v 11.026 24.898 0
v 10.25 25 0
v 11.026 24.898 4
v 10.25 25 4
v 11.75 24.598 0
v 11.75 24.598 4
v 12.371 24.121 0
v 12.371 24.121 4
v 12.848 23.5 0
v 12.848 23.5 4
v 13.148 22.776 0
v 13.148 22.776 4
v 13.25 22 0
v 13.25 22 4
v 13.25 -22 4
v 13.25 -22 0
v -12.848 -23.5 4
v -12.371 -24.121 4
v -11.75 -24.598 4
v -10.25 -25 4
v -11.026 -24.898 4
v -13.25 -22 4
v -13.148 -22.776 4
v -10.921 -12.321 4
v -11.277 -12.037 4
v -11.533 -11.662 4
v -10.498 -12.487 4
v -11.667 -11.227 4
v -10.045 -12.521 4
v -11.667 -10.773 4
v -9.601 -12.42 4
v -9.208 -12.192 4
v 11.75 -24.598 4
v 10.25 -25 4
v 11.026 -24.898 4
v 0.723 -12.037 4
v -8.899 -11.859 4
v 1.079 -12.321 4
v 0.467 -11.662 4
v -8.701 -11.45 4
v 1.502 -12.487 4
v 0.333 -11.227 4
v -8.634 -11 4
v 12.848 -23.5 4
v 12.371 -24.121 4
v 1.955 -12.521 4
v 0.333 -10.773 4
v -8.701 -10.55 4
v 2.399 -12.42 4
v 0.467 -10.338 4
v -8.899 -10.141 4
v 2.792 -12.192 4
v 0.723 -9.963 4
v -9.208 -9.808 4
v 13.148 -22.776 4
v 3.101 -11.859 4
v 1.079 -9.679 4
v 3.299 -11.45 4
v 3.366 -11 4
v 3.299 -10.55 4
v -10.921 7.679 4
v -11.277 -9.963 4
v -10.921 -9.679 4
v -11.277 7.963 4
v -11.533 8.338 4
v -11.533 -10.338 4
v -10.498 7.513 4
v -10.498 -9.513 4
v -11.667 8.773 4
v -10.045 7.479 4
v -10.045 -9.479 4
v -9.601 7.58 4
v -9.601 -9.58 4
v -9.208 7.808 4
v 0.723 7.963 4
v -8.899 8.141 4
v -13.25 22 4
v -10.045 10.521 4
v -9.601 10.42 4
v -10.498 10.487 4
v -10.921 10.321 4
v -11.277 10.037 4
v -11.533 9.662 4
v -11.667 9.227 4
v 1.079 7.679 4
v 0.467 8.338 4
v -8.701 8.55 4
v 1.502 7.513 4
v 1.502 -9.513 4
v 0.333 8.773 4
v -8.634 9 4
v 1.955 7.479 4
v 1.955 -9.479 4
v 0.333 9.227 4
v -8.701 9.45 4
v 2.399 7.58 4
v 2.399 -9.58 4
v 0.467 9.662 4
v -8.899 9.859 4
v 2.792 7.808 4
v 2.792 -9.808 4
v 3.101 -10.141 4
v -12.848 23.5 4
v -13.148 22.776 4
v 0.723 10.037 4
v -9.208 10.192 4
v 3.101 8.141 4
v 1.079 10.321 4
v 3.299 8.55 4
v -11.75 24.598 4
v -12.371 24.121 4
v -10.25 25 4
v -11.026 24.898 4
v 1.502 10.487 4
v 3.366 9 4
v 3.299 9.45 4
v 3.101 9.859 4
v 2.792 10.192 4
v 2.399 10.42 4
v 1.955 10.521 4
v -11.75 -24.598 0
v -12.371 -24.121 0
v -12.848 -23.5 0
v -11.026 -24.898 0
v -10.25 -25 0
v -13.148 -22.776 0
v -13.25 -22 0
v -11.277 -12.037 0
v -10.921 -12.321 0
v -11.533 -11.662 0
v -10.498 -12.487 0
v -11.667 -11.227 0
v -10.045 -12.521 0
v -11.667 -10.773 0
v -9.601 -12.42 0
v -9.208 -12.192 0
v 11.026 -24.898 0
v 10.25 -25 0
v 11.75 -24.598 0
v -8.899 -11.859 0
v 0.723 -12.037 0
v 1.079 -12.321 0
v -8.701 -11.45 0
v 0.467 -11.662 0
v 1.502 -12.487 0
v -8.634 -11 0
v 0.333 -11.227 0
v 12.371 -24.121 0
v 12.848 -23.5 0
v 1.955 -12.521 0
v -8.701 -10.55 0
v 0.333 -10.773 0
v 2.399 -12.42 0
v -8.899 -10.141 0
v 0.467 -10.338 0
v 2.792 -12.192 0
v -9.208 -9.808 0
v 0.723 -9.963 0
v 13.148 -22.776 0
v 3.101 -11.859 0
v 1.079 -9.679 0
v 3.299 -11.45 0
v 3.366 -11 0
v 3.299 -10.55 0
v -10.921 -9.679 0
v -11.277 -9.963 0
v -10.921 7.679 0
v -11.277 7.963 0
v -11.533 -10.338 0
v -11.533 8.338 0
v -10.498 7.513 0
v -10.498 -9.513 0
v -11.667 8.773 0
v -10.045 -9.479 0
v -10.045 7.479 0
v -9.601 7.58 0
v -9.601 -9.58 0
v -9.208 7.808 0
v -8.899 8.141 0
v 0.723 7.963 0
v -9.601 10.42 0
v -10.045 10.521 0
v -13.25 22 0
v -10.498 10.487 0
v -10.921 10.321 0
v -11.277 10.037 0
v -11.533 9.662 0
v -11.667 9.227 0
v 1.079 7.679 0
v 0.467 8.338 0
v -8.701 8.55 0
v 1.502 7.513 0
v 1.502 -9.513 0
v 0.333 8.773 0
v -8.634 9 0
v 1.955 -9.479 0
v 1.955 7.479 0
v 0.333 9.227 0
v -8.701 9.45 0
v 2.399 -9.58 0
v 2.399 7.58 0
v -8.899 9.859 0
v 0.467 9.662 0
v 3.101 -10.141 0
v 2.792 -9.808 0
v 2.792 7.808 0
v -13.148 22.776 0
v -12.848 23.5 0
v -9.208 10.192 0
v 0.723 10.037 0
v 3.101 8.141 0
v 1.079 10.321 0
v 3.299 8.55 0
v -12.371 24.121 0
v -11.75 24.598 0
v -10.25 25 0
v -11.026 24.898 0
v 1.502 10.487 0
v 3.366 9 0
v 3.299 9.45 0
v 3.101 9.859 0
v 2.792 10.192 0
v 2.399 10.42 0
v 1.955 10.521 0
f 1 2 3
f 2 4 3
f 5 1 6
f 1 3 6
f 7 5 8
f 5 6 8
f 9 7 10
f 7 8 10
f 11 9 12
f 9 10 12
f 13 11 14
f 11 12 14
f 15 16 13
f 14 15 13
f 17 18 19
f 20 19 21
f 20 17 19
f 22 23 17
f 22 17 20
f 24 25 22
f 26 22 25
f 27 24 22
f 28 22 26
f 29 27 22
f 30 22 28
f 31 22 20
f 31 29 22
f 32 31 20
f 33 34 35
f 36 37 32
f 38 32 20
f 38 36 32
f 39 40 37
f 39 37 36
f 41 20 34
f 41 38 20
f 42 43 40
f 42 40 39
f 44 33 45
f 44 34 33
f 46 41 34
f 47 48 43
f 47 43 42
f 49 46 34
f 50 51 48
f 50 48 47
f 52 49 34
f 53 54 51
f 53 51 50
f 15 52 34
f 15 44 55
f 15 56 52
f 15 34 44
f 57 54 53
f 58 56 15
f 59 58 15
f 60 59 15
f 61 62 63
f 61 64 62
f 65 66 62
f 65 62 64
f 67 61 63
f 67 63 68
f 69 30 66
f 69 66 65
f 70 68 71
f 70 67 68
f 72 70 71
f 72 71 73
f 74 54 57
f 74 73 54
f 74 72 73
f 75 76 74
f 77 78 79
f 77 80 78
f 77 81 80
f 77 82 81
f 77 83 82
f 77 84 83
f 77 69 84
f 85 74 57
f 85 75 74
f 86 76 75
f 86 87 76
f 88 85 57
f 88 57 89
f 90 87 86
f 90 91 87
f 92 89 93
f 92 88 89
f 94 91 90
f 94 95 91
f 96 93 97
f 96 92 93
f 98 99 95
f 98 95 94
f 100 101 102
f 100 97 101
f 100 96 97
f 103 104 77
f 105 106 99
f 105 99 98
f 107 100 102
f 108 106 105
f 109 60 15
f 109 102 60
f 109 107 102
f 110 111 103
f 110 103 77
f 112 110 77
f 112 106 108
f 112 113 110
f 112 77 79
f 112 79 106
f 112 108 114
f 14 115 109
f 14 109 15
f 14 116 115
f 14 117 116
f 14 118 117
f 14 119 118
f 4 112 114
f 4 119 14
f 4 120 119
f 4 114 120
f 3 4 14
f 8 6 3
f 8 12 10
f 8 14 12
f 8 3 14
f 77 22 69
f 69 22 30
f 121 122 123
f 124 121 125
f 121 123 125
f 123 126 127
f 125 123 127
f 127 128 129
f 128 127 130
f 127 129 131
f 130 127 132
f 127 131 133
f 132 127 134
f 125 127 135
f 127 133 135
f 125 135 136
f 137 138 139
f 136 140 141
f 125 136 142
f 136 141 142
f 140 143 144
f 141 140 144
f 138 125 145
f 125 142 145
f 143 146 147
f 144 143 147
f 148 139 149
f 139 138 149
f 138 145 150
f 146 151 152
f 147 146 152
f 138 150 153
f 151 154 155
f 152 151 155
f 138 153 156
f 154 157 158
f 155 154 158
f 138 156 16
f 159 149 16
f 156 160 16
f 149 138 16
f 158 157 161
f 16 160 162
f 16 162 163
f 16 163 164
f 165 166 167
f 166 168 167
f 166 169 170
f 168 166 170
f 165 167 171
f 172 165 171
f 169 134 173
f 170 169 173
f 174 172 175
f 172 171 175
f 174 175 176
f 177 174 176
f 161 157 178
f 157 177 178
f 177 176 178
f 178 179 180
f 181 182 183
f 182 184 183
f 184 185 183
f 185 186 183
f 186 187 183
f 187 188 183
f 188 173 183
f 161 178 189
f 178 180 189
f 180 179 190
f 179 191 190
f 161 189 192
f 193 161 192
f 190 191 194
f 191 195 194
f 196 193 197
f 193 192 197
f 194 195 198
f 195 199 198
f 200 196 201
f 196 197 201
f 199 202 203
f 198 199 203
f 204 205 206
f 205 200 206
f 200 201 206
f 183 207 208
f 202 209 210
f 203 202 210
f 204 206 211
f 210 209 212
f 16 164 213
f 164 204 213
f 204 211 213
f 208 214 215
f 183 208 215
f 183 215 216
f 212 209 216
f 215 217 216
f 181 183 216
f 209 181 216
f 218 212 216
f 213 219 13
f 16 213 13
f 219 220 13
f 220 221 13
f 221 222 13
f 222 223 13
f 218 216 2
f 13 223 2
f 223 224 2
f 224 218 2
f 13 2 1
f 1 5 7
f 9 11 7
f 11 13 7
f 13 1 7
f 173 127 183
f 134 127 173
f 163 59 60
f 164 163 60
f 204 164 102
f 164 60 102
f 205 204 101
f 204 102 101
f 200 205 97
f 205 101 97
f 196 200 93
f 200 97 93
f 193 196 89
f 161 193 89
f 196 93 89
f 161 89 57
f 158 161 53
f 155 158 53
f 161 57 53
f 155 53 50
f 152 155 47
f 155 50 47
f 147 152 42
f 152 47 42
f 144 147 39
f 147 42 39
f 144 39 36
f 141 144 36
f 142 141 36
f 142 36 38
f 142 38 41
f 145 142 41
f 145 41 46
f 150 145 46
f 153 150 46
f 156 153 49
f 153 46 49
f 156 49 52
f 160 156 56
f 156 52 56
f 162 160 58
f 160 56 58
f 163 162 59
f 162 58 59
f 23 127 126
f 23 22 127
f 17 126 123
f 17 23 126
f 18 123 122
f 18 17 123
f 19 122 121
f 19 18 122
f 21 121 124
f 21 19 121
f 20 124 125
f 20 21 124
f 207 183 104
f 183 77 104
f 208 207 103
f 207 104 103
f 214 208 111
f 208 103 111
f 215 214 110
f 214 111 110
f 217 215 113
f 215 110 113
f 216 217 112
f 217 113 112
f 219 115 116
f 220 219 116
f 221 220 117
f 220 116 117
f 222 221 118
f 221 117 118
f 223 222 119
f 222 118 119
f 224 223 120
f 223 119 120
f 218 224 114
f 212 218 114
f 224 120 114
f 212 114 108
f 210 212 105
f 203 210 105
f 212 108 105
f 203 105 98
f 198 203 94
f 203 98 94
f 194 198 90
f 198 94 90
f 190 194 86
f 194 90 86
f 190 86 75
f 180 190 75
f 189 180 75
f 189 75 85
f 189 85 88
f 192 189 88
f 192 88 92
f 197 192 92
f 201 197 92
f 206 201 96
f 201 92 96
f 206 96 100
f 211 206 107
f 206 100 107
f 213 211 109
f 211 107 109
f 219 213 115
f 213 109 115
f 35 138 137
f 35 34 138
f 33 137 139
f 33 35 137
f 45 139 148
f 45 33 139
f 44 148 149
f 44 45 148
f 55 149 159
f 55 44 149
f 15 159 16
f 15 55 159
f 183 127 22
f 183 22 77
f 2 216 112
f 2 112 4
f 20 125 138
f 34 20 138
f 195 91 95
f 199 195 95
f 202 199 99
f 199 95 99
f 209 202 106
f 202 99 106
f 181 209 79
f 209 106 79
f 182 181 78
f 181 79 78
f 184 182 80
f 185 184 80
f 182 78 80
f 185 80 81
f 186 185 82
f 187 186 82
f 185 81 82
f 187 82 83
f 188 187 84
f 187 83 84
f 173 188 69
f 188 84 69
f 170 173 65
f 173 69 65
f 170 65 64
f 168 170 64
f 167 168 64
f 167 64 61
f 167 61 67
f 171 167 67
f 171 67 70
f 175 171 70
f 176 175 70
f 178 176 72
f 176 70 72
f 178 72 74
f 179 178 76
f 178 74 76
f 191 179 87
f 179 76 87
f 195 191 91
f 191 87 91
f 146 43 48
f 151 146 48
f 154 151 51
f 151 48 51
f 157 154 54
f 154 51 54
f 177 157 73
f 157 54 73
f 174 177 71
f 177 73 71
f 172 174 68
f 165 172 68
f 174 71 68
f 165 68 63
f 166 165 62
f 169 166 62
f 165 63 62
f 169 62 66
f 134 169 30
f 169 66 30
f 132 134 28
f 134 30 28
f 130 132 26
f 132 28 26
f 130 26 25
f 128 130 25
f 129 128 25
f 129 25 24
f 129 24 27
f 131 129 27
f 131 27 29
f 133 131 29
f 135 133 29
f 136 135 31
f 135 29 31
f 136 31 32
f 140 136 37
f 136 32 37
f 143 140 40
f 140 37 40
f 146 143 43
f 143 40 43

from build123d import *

# Parameters (mm, degrees)
SKETCH_1_W          = 26.5
SKETCH_1_H          = 50
EXTRUDE_1_DEPTH     = 4
SKETCH_2_R          = 1.525
CUT_EXTRUDE_1_DEPTH = 4
FILLET_1_R          = 3


with BuildPart() as part:
    # 草图1 → 凸台-拉伸1 (new body)
    with BuildSketch(Plane.XY):
        Rectangle(SKETCH_1_W, SKETCH_1_H)
    extrude(amount=EXTRUDE_1_DEPTH)

    # 草图2 → 切除-拉伸1 (cut)
    with BuildSketch(Plane.XY.offset(4)):
        with Locations((-10.158640444, 9)):
            Circle(SKETCH_2_R)
        with Locations((1.841359556, 9)):
            Circle(SKETCH_2_R)
        with Locations((-10.158640444, -11)):
            Circle(SKETCH_2_R)
        with Locations((1.841359556, -11)):
            Circle(SKETCH_2_R)
    extrude(amount=-CUT_EXTRUDE_1_DEPTH, mode=Mode.SUBTRACT)

    # 圆角1
    fillet_1_edges = [part.edges().sort_by_distance(p)[0] for p in [
        (13.25, -25, 2),
        (-13.25, -25, 2),
        (-13.25, 25, 2),
        (13.25, 25, 2),
    ]]
    fillet(fillet_1_edges, radius=FILLET_1_R)


solid = part.part
